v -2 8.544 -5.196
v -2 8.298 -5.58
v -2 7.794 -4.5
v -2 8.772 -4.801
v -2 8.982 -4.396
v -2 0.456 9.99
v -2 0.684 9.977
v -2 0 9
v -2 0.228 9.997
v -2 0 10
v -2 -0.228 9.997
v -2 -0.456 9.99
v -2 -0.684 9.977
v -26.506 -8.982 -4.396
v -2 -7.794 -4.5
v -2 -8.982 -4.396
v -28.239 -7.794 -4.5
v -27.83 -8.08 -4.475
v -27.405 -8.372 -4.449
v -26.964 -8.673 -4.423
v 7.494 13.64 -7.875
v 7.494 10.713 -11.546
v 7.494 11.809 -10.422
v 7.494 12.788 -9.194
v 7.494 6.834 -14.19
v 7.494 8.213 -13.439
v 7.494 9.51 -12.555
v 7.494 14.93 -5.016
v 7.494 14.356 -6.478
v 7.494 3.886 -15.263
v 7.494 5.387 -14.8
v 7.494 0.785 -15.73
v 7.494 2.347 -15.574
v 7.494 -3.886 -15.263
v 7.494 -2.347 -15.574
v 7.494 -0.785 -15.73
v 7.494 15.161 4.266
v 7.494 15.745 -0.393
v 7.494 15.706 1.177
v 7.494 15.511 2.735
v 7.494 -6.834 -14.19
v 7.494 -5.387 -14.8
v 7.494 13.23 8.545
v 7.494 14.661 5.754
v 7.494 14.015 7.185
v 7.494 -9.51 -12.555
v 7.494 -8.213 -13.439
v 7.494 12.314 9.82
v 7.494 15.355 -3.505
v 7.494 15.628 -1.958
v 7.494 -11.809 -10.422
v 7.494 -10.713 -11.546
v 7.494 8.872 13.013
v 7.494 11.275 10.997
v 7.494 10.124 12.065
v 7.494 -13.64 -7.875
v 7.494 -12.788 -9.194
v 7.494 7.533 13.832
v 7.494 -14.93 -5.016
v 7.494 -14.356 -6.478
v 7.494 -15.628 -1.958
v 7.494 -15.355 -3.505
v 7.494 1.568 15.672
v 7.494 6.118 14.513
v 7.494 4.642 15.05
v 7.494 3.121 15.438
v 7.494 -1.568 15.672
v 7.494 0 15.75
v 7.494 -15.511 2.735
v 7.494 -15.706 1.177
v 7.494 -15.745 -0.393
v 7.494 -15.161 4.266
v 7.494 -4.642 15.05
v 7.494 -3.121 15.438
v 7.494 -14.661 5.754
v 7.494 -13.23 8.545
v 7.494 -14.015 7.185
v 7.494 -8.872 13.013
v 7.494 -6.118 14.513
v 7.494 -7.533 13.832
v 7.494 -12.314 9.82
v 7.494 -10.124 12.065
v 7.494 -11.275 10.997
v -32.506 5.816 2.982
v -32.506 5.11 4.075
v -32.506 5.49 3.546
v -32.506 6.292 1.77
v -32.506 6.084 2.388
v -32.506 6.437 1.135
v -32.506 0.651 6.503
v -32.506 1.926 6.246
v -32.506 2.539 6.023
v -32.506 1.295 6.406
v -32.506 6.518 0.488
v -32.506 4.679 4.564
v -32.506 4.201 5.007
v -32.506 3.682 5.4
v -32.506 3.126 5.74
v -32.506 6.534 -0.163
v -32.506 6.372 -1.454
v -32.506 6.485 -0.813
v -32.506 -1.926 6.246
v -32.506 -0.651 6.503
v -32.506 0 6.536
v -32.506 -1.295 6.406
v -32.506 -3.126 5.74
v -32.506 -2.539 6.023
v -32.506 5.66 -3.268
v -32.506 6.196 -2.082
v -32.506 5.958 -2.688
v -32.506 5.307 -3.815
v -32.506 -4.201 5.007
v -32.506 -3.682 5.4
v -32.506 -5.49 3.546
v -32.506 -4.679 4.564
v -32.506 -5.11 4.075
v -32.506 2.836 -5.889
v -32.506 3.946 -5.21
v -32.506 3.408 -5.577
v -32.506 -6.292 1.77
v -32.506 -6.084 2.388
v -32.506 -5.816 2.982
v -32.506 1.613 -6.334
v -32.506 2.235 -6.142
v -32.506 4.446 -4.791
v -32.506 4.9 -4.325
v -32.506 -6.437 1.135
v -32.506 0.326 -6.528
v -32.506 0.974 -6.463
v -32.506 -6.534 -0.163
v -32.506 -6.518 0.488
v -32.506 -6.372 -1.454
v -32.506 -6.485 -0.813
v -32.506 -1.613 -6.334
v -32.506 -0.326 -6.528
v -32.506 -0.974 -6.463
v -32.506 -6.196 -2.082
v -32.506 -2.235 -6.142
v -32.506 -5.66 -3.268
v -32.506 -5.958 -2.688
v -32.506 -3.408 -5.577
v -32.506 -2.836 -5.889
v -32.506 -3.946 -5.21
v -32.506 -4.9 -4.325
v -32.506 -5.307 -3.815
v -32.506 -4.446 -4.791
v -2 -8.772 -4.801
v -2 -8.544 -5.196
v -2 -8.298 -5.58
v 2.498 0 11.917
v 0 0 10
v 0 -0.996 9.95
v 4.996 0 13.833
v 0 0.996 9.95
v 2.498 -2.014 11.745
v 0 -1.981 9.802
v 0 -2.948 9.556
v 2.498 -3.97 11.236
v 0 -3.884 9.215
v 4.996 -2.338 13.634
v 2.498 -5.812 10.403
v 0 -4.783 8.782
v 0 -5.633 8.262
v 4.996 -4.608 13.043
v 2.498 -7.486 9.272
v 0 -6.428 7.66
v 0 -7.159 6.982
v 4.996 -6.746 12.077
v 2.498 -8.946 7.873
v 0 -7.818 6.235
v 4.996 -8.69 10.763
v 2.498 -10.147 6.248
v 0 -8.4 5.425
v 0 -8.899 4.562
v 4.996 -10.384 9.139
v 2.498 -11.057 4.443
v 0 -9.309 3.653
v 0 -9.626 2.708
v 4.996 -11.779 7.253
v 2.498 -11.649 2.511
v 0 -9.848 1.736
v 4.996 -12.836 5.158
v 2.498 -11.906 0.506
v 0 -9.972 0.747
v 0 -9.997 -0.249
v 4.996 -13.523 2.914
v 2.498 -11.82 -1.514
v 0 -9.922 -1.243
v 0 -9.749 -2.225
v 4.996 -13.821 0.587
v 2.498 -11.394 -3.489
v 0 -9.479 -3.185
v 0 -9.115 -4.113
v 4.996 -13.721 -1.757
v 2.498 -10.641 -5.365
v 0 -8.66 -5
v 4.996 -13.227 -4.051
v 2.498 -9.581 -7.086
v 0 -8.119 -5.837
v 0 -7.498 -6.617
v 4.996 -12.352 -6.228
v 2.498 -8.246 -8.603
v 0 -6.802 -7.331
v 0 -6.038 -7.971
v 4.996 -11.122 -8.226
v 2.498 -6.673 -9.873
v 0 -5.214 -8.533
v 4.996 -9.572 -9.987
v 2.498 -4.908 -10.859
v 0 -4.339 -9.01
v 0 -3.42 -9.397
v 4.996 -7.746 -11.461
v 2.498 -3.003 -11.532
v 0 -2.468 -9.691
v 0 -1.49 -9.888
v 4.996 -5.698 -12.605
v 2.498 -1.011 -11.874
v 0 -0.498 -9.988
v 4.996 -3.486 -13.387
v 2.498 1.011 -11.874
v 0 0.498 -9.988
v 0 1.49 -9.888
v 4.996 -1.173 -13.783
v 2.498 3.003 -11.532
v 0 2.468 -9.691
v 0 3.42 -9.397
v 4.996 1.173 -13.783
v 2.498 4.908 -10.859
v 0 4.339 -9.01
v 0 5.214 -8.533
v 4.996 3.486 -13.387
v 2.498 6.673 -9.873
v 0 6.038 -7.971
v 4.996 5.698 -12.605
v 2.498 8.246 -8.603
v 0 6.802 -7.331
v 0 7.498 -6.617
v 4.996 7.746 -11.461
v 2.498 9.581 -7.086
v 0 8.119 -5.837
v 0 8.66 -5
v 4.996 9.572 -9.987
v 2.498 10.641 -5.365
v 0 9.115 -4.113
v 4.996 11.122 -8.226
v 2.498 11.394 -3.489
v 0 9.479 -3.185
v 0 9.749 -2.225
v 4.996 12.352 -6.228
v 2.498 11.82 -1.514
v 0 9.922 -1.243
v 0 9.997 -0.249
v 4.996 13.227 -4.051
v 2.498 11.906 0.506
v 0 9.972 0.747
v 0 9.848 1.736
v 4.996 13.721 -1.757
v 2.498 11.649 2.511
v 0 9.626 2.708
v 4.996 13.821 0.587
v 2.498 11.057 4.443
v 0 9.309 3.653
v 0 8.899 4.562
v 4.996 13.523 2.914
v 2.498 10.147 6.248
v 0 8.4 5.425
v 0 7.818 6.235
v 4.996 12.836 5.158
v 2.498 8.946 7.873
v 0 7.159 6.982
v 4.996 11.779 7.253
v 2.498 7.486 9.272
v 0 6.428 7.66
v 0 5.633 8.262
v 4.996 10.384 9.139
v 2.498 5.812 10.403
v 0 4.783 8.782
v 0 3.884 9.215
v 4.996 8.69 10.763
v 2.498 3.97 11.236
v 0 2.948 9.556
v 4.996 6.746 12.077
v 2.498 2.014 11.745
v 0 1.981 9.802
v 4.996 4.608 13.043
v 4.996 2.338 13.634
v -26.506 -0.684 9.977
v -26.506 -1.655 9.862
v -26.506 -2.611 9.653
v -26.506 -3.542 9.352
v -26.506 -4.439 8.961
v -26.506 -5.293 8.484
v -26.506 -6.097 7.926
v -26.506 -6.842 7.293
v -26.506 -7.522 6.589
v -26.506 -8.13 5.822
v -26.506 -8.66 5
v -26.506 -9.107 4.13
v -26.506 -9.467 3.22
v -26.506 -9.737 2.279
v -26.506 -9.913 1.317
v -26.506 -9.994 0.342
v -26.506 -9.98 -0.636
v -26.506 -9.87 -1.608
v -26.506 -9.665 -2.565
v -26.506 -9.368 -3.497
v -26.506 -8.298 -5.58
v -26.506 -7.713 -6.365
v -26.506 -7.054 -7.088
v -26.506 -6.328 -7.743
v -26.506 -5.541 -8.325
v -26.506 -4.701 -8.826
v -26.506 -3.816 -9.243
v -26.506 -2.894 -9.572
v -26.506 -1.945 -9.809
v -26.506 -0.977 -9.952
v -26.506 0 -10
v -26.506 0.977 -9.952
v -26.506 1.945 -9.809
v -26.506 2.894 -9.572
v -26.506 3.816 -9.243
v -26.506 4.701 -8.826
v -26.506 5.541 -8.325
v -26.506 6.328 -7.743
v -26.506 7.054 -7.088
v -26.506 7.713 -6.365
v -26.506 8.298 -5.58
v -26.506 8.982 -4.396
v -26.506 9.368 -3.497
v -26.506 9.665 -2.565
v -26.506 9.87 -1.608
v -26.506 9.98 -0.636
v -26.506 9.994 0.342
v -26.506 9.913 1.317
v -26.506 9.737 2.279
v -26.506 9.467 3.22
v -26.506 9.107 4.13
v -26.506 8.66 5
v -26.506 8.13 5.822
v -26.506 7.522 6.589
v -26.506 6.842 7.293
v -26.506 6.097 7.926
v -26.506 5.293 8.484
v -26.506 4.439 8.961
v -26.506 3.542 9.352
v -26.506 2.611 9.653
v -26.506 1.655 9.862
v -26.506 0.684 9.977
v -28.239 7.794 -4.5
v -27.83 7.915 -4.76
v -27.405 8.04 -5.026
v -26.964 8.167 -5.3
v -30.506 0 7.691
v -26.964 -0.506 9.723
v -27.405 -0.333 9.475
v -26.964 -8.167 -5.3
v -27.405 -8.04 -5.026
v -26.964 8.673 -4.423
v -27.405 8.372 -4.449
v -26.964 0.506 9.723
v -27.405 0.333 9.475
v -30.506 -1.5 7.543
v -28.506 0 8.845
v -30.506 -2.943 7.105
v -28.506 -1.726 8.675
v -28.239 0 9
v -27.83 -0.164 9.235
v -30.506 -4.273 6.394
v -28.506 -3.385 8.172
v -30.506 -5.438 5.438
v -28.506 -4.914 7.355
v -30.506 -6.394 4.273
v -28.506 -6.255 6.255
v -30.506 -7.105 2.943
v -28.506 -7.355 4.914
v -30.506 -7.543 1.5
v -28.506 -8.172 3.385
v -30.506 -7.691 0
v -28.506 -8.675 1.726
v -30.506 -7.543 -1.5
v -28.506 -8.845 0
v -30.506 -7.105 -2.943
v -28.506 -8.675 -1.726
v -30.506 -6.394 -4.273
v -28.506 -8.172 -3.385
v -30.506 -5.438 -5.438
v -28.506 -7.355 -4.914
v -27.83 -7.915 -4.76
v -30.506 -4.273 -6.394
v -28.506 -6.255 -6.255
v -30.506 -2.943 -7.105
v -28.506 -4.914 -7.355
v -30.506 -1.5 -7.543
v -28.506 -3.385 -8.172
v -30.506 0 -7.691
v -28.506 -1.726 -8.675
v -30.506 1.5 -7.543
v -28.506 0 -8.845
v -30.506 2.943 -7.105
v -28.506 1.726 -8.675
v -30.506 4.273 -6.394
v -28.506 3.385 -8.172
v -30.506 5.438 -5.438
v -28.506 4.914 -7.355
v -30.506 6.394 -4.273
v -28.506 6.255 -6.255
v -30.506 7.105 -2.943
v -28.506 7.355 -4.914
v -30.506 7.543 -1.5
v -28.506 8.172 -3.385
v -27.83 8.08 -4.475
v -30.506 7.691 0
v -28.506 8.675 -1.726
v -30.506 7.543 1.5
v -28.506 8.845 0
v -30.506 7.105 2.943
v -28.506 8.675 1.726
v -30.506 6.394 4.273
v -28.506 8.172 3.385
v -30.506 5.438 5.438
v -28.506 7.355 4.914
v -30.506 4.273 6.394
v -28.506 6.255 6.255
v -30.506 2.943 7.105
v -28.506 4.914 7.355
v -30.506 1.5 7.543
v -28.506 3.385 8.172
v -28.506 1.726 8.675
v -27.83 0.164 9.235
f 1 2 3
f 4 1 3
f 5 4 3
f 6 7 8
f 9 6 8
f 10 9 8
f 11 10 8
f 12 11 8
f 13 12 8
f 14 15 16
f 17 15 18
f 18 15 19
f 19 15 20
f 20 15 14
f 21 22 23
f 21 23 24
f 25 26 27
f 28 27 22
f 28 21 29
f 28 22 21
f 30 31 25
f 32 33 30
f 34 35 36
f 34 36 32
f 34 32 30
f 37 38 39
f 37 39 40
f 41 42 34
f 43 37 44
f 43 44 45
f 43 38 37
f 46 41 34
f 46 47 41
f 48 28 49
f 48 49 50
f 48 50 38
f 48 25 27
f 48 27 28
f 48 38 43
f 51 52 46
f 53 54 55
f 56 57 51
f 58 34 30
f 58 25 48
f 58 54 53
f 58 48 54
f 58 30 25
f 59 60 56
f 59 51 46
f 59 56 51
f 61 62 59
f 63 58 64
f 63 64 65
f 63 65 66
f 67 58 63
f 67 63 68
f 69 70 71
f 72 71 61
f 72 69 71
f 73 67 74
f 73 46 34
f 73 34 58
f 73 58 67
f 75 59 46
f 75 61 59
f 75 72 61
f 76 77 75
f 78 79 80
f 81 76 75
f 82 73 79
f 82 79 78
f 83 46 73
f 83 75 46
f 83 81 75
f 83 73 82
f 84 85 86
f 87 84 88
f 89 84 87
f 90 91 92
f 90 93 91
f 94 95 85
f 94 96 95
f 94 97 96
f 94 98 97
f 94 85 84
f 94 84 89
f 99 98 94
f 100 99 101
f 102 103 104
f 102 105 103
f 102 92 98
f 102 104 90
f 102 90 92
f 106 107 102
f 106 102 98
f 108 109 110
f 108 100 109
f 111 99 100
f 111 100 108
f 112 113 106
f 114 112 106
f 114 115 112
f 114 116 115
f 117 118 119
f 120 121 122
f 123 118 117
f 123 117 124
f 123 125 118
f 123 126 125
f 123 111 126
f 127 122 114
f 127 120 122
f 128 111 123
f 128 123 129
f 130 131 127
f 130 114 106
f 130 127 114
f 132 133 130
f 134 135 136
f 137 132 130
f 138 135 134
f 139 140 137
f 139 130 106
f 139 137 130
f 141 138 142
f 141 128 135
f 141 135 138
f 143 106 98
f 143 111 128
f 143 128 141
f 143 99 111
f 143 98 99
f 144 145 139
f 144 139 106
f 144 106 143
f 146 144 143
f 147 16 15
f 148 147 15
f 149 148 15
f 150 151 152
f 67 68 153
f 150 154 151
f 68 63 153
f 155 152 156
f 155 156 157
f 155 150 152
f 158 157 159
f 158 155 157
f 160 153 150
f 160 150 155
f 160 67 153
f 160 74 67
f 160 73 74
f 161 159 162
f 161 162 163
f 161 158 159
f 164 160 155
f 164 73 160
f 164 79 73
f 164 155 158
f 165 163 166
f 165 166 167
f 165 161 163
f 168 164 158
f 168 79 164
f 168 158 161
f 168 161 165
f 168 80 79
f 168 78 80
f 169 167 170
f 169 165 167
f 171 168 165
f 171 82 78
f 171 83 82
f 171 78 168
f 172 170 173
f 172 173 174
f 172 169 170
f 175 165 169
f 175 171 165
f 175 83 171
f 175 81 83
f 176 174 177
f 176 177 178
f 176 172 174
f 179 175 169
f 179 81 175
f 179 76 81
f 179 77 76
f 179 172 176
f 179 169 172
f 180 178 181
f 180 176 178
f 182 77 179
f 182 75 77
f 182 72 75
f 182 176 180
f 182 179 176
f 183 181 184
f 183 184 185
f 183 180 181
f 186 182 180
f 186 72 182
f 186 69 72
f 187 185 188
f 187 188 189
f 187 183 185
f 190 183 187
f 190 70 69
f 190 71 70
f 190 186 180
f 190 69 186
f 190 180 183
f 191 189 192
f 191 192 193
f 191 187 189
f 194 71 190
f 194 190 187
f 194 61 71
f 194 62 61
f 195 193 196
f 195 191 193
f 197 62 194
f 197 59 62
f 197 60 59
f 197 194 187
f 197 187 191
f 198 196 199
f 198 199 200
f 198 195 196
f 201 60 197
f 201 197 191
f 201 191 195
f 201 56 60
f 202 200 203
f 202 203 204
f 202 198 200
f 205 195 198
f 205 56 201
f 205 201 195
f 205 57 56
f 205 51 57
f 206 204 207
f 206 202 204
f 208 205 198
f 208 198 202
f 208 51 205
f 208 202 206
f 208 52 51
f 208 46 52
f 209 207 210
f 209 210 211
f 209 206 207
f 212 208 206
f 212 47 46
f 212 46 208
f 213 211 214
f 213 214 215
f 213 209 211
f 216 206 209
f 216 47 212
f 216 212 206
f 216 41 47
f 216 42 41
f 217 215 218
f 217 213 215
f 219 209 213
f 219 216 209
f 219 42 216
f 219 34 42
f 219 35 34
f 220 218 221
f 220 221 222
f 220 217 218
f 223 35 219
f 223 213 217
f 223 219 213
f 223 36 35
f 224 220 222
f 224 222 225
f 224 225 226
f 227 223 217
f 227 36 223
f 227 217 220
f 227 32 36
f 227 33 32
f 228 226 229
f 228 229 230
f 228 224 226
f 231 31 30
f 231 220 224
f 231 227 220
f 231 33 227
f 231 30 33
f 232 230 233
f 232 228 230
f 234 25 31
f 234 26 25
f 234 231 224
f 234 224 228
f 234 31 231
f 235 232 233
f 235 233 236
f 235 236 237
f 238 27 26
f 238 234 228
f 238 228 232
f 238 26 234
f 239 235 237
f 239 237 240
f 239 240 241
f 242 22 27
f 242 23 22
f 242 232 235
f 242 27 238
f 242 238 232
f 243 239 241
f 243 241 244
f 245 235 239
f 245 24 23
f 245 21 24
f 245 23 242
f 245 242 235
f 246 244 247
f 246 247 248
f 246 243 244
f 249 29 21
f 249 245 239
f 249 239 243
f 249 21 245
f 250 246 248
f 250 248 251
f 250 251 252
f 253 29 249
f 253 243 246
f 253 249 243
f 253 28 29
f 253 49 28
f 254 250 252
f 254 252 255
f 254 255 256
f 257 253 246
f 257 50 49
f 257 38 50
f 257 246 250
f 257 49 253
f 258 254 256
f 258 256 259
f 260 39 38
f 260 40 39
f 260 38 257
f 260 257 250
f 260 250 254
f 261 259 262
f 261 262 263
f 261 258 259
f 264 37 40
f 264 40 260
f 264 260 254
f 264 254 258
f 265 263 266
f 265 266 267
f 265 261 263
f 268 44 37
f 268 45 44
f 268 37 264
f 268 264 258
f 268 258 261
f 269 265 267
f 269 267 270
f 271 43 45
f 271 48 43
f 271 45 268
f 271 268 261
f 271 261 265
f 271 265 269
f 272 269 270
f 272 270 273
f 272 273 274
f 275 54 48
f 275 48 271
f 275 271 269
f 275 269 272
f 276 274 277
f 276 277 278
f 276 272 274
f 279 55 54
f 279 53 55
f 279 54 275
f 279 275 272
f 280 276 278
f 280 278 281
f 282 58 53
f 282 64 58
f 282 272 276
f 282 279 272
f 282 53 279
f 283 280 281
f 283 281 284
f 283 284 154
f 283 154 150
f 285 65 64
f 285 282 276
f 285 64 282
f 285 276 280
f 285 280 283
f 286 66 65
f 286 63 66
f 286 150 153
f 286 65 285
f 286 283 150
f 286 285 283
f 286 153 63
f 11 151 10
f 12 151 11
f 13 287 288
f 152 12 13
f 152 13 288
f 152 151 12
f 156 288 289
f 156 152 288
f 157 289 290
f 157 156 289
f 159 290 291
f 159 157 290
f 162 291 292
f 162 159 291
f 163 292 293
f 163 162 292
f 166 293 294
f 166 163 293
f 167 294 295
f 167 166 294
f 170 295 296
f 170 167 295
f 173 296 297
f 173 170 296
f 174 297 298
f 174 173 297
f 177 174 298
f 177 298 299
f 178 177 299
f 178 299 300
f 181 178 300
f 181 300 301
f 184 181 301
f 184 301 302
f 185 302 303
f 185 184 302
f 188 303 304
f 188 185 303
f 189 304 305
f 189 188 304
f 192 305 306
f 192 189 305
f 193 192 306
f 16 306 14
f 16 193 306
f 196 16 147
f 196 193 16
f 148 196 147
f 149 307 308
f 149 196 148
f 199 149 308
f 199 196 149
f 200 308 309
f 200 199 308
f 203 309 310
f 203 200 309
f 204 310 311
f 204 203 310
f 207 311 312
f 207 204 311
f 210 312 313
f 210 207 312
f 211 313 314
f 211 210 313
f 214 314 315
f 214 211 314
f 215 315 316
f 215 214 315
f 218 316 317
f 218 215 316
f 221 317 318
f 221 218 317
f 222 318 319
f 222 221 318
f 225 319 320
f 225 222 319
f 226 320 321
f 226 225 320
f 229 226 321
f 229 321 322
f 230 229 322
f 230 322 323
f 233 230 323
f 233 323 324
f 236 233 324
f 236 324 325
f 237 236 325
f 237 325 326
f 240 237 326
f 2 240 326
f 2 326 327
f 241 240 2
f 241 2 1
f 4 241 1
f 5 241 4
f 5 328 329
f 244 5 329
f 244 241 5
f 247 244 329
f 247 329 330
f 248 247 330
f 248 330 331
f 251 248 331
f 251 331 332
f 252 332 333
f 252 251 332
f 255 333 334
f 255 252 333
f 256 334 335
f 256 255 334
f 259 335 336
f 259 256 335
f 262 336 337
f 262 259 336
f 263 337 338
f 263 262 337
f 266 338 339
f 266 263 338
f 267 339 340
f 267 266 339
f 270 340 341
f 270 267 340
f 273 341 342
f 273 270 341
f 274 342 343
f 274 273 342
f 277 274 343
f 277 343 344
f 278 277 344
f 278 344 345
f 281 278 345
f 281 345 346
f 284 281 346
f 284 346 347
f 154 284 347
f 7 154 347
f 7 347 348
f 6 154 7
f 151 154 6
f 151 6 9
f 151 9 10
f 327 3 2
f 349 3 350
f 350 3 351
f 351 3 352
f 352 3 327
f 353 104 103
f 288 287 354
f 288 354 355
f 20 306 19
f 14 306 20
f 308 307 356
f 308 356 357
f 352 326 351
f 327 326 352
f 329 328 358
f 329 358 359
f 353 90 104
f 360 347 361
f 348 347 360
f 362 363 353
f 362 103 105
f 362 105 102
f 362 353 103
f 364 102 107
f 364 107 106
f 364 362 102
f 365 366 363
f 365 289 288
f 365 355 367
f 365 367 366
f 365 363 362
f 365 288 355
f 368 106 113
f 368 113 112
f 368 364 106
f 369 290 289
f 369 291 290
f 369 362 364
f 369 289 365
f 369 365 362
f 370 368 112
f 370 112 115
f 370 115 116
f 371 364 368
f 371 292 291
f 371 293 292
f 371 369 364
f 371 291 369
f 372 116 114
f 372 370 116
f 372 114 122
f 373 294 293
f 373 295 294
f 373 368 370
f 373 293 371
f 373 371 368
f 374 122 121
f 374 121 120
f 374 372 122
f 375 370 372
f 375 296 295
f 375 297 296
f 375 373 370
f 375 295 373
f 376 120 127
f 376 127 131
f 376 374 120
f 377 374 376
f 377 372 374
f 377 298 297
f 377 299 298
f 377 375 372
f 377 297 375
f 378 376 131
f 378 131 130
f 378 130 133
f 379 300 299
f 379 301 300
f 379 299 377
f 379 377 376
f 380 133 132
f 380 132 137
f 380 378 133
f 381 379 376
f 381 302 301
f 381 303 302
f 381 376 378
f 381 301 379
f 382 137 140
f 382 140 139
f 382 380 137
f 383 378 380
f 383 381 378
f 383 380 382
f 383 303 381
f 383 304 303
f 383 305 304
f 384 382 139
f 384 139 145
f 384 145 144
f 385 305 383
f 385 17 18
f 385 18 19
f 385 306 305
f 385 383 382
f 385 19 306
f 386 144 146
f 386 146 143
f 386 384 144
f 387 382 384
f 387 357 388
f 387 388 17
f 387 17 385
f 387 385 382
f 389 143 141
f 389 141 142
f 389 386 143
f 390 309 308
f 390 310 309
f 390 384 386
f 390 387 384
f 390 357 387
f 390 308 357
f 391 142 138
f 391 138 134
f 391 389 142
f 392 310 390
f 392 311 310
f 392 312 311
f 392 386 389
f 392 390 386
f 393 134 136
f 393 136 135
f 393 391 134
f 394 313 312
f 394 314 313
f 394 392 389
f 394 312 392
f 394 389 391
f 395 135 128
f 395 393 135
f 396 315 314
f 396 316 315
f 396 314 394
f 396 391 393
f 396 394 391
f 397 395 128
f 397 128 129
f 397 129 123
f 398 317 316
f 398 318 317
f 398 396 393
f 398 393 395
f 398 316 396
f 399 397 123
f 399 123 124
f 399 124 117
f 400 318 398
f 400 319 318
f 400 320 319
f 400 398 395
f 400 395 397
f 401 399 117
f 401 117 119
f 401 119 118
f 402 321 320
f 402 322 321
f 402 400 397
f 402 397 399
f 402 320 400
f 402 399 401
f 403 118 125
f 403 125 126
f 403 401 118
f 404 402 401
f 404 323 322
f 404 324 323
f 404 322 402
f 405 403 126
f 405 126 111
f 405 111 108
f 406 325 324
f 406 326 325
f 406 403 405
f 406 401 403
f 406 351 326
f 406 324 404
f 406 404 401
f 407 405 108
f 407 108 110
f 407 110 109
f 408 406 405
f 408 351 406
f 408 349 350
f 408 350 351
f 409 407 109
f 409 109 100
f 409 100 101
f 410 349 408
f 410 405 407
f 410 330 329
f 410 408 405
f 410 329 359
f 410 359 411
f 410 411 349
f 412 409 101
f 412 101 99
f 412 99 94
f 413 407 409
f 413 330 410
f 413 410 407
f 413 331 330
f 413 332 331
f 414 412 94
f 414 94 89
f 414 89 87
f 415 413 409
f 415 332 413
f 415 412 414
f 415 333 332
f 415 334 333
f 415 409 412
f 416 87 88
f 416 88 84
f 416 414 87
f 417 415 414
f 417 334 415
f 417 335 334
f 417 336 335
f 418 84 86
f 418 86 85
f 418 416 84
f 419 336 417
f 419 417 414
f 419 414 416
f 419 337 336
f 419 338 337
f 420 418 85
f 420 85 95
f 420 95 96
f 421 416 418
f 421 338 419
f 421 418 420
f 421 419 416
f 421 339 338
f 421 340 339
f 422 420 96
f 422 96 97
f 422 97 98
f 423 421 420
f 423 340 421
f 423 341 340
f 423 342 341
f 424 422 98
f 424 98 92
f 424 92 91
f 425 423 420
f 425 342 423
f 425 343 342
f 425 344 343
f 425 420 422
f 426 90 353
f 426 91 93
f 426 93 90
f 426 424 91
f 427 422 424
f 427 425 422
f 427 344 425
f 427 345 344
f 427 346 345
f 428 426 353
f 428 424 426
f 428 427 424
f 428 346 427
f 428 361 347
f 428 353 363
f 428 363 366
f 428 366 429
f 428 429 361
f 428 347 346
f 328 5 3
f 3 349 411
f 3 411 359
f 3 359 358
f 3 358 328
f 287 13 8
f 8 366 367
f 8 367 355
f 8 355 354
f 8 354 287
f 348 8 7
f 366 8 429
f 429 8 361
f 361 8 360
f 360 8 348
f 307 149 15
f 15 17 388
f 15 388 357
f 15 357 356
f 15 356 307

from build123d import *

# Parameters (mm, degrees)
CUT_EXTRUDE1_DEPTH = 30.506454095
CIRPATTERN1_COUNT  = 3


with BuildPart() as part:
    # Sketch1 → Base-Revolve (revolve)
    with BuildSketch(Plane.XY, mode=Mode.PRIVATE) as base_revolve_sk:
        Polygon((-32.506454106, 0), (-32.506454106, 6.535898385), (-26.506454106, 10), (0, 10), (7.493545894, 15.75), (7.493545894, 0), align=None)
    revolve(base_revolve_sk.sketch.rotate(Axis((-40, 0, 0), (1, 0, 0)), 90), axis=Axis((-40, 0, 0), (1, 0, 0)))

    # Sketch2 → Cut-Extrude1 (cut)
    with BuildSketch(Plane.ZY.offset(32.506454106)):
        Polygon((9, 0), (10, 0.700207538), (10, -0.700207538), align=None)
    cut_extrude1 = extrude(amount=-CUT_EXTRUDE1_DEPTH, mode=Mode.SUBTRACT)

    # CirPattern1: Cut-Extrude1 ×3 about axis
    cirpattern1_axis = Axis((0, 0, 0), (1, 0, 0))
    for i in range(1, CIRPATTERN1_COUNT):
        add(cut_extrude1.rotate(cirpattern1_axis, i * 360 / CIRPATTERN1_COUNT), mode=Mode.SUBTRACT)


solid = part.part
